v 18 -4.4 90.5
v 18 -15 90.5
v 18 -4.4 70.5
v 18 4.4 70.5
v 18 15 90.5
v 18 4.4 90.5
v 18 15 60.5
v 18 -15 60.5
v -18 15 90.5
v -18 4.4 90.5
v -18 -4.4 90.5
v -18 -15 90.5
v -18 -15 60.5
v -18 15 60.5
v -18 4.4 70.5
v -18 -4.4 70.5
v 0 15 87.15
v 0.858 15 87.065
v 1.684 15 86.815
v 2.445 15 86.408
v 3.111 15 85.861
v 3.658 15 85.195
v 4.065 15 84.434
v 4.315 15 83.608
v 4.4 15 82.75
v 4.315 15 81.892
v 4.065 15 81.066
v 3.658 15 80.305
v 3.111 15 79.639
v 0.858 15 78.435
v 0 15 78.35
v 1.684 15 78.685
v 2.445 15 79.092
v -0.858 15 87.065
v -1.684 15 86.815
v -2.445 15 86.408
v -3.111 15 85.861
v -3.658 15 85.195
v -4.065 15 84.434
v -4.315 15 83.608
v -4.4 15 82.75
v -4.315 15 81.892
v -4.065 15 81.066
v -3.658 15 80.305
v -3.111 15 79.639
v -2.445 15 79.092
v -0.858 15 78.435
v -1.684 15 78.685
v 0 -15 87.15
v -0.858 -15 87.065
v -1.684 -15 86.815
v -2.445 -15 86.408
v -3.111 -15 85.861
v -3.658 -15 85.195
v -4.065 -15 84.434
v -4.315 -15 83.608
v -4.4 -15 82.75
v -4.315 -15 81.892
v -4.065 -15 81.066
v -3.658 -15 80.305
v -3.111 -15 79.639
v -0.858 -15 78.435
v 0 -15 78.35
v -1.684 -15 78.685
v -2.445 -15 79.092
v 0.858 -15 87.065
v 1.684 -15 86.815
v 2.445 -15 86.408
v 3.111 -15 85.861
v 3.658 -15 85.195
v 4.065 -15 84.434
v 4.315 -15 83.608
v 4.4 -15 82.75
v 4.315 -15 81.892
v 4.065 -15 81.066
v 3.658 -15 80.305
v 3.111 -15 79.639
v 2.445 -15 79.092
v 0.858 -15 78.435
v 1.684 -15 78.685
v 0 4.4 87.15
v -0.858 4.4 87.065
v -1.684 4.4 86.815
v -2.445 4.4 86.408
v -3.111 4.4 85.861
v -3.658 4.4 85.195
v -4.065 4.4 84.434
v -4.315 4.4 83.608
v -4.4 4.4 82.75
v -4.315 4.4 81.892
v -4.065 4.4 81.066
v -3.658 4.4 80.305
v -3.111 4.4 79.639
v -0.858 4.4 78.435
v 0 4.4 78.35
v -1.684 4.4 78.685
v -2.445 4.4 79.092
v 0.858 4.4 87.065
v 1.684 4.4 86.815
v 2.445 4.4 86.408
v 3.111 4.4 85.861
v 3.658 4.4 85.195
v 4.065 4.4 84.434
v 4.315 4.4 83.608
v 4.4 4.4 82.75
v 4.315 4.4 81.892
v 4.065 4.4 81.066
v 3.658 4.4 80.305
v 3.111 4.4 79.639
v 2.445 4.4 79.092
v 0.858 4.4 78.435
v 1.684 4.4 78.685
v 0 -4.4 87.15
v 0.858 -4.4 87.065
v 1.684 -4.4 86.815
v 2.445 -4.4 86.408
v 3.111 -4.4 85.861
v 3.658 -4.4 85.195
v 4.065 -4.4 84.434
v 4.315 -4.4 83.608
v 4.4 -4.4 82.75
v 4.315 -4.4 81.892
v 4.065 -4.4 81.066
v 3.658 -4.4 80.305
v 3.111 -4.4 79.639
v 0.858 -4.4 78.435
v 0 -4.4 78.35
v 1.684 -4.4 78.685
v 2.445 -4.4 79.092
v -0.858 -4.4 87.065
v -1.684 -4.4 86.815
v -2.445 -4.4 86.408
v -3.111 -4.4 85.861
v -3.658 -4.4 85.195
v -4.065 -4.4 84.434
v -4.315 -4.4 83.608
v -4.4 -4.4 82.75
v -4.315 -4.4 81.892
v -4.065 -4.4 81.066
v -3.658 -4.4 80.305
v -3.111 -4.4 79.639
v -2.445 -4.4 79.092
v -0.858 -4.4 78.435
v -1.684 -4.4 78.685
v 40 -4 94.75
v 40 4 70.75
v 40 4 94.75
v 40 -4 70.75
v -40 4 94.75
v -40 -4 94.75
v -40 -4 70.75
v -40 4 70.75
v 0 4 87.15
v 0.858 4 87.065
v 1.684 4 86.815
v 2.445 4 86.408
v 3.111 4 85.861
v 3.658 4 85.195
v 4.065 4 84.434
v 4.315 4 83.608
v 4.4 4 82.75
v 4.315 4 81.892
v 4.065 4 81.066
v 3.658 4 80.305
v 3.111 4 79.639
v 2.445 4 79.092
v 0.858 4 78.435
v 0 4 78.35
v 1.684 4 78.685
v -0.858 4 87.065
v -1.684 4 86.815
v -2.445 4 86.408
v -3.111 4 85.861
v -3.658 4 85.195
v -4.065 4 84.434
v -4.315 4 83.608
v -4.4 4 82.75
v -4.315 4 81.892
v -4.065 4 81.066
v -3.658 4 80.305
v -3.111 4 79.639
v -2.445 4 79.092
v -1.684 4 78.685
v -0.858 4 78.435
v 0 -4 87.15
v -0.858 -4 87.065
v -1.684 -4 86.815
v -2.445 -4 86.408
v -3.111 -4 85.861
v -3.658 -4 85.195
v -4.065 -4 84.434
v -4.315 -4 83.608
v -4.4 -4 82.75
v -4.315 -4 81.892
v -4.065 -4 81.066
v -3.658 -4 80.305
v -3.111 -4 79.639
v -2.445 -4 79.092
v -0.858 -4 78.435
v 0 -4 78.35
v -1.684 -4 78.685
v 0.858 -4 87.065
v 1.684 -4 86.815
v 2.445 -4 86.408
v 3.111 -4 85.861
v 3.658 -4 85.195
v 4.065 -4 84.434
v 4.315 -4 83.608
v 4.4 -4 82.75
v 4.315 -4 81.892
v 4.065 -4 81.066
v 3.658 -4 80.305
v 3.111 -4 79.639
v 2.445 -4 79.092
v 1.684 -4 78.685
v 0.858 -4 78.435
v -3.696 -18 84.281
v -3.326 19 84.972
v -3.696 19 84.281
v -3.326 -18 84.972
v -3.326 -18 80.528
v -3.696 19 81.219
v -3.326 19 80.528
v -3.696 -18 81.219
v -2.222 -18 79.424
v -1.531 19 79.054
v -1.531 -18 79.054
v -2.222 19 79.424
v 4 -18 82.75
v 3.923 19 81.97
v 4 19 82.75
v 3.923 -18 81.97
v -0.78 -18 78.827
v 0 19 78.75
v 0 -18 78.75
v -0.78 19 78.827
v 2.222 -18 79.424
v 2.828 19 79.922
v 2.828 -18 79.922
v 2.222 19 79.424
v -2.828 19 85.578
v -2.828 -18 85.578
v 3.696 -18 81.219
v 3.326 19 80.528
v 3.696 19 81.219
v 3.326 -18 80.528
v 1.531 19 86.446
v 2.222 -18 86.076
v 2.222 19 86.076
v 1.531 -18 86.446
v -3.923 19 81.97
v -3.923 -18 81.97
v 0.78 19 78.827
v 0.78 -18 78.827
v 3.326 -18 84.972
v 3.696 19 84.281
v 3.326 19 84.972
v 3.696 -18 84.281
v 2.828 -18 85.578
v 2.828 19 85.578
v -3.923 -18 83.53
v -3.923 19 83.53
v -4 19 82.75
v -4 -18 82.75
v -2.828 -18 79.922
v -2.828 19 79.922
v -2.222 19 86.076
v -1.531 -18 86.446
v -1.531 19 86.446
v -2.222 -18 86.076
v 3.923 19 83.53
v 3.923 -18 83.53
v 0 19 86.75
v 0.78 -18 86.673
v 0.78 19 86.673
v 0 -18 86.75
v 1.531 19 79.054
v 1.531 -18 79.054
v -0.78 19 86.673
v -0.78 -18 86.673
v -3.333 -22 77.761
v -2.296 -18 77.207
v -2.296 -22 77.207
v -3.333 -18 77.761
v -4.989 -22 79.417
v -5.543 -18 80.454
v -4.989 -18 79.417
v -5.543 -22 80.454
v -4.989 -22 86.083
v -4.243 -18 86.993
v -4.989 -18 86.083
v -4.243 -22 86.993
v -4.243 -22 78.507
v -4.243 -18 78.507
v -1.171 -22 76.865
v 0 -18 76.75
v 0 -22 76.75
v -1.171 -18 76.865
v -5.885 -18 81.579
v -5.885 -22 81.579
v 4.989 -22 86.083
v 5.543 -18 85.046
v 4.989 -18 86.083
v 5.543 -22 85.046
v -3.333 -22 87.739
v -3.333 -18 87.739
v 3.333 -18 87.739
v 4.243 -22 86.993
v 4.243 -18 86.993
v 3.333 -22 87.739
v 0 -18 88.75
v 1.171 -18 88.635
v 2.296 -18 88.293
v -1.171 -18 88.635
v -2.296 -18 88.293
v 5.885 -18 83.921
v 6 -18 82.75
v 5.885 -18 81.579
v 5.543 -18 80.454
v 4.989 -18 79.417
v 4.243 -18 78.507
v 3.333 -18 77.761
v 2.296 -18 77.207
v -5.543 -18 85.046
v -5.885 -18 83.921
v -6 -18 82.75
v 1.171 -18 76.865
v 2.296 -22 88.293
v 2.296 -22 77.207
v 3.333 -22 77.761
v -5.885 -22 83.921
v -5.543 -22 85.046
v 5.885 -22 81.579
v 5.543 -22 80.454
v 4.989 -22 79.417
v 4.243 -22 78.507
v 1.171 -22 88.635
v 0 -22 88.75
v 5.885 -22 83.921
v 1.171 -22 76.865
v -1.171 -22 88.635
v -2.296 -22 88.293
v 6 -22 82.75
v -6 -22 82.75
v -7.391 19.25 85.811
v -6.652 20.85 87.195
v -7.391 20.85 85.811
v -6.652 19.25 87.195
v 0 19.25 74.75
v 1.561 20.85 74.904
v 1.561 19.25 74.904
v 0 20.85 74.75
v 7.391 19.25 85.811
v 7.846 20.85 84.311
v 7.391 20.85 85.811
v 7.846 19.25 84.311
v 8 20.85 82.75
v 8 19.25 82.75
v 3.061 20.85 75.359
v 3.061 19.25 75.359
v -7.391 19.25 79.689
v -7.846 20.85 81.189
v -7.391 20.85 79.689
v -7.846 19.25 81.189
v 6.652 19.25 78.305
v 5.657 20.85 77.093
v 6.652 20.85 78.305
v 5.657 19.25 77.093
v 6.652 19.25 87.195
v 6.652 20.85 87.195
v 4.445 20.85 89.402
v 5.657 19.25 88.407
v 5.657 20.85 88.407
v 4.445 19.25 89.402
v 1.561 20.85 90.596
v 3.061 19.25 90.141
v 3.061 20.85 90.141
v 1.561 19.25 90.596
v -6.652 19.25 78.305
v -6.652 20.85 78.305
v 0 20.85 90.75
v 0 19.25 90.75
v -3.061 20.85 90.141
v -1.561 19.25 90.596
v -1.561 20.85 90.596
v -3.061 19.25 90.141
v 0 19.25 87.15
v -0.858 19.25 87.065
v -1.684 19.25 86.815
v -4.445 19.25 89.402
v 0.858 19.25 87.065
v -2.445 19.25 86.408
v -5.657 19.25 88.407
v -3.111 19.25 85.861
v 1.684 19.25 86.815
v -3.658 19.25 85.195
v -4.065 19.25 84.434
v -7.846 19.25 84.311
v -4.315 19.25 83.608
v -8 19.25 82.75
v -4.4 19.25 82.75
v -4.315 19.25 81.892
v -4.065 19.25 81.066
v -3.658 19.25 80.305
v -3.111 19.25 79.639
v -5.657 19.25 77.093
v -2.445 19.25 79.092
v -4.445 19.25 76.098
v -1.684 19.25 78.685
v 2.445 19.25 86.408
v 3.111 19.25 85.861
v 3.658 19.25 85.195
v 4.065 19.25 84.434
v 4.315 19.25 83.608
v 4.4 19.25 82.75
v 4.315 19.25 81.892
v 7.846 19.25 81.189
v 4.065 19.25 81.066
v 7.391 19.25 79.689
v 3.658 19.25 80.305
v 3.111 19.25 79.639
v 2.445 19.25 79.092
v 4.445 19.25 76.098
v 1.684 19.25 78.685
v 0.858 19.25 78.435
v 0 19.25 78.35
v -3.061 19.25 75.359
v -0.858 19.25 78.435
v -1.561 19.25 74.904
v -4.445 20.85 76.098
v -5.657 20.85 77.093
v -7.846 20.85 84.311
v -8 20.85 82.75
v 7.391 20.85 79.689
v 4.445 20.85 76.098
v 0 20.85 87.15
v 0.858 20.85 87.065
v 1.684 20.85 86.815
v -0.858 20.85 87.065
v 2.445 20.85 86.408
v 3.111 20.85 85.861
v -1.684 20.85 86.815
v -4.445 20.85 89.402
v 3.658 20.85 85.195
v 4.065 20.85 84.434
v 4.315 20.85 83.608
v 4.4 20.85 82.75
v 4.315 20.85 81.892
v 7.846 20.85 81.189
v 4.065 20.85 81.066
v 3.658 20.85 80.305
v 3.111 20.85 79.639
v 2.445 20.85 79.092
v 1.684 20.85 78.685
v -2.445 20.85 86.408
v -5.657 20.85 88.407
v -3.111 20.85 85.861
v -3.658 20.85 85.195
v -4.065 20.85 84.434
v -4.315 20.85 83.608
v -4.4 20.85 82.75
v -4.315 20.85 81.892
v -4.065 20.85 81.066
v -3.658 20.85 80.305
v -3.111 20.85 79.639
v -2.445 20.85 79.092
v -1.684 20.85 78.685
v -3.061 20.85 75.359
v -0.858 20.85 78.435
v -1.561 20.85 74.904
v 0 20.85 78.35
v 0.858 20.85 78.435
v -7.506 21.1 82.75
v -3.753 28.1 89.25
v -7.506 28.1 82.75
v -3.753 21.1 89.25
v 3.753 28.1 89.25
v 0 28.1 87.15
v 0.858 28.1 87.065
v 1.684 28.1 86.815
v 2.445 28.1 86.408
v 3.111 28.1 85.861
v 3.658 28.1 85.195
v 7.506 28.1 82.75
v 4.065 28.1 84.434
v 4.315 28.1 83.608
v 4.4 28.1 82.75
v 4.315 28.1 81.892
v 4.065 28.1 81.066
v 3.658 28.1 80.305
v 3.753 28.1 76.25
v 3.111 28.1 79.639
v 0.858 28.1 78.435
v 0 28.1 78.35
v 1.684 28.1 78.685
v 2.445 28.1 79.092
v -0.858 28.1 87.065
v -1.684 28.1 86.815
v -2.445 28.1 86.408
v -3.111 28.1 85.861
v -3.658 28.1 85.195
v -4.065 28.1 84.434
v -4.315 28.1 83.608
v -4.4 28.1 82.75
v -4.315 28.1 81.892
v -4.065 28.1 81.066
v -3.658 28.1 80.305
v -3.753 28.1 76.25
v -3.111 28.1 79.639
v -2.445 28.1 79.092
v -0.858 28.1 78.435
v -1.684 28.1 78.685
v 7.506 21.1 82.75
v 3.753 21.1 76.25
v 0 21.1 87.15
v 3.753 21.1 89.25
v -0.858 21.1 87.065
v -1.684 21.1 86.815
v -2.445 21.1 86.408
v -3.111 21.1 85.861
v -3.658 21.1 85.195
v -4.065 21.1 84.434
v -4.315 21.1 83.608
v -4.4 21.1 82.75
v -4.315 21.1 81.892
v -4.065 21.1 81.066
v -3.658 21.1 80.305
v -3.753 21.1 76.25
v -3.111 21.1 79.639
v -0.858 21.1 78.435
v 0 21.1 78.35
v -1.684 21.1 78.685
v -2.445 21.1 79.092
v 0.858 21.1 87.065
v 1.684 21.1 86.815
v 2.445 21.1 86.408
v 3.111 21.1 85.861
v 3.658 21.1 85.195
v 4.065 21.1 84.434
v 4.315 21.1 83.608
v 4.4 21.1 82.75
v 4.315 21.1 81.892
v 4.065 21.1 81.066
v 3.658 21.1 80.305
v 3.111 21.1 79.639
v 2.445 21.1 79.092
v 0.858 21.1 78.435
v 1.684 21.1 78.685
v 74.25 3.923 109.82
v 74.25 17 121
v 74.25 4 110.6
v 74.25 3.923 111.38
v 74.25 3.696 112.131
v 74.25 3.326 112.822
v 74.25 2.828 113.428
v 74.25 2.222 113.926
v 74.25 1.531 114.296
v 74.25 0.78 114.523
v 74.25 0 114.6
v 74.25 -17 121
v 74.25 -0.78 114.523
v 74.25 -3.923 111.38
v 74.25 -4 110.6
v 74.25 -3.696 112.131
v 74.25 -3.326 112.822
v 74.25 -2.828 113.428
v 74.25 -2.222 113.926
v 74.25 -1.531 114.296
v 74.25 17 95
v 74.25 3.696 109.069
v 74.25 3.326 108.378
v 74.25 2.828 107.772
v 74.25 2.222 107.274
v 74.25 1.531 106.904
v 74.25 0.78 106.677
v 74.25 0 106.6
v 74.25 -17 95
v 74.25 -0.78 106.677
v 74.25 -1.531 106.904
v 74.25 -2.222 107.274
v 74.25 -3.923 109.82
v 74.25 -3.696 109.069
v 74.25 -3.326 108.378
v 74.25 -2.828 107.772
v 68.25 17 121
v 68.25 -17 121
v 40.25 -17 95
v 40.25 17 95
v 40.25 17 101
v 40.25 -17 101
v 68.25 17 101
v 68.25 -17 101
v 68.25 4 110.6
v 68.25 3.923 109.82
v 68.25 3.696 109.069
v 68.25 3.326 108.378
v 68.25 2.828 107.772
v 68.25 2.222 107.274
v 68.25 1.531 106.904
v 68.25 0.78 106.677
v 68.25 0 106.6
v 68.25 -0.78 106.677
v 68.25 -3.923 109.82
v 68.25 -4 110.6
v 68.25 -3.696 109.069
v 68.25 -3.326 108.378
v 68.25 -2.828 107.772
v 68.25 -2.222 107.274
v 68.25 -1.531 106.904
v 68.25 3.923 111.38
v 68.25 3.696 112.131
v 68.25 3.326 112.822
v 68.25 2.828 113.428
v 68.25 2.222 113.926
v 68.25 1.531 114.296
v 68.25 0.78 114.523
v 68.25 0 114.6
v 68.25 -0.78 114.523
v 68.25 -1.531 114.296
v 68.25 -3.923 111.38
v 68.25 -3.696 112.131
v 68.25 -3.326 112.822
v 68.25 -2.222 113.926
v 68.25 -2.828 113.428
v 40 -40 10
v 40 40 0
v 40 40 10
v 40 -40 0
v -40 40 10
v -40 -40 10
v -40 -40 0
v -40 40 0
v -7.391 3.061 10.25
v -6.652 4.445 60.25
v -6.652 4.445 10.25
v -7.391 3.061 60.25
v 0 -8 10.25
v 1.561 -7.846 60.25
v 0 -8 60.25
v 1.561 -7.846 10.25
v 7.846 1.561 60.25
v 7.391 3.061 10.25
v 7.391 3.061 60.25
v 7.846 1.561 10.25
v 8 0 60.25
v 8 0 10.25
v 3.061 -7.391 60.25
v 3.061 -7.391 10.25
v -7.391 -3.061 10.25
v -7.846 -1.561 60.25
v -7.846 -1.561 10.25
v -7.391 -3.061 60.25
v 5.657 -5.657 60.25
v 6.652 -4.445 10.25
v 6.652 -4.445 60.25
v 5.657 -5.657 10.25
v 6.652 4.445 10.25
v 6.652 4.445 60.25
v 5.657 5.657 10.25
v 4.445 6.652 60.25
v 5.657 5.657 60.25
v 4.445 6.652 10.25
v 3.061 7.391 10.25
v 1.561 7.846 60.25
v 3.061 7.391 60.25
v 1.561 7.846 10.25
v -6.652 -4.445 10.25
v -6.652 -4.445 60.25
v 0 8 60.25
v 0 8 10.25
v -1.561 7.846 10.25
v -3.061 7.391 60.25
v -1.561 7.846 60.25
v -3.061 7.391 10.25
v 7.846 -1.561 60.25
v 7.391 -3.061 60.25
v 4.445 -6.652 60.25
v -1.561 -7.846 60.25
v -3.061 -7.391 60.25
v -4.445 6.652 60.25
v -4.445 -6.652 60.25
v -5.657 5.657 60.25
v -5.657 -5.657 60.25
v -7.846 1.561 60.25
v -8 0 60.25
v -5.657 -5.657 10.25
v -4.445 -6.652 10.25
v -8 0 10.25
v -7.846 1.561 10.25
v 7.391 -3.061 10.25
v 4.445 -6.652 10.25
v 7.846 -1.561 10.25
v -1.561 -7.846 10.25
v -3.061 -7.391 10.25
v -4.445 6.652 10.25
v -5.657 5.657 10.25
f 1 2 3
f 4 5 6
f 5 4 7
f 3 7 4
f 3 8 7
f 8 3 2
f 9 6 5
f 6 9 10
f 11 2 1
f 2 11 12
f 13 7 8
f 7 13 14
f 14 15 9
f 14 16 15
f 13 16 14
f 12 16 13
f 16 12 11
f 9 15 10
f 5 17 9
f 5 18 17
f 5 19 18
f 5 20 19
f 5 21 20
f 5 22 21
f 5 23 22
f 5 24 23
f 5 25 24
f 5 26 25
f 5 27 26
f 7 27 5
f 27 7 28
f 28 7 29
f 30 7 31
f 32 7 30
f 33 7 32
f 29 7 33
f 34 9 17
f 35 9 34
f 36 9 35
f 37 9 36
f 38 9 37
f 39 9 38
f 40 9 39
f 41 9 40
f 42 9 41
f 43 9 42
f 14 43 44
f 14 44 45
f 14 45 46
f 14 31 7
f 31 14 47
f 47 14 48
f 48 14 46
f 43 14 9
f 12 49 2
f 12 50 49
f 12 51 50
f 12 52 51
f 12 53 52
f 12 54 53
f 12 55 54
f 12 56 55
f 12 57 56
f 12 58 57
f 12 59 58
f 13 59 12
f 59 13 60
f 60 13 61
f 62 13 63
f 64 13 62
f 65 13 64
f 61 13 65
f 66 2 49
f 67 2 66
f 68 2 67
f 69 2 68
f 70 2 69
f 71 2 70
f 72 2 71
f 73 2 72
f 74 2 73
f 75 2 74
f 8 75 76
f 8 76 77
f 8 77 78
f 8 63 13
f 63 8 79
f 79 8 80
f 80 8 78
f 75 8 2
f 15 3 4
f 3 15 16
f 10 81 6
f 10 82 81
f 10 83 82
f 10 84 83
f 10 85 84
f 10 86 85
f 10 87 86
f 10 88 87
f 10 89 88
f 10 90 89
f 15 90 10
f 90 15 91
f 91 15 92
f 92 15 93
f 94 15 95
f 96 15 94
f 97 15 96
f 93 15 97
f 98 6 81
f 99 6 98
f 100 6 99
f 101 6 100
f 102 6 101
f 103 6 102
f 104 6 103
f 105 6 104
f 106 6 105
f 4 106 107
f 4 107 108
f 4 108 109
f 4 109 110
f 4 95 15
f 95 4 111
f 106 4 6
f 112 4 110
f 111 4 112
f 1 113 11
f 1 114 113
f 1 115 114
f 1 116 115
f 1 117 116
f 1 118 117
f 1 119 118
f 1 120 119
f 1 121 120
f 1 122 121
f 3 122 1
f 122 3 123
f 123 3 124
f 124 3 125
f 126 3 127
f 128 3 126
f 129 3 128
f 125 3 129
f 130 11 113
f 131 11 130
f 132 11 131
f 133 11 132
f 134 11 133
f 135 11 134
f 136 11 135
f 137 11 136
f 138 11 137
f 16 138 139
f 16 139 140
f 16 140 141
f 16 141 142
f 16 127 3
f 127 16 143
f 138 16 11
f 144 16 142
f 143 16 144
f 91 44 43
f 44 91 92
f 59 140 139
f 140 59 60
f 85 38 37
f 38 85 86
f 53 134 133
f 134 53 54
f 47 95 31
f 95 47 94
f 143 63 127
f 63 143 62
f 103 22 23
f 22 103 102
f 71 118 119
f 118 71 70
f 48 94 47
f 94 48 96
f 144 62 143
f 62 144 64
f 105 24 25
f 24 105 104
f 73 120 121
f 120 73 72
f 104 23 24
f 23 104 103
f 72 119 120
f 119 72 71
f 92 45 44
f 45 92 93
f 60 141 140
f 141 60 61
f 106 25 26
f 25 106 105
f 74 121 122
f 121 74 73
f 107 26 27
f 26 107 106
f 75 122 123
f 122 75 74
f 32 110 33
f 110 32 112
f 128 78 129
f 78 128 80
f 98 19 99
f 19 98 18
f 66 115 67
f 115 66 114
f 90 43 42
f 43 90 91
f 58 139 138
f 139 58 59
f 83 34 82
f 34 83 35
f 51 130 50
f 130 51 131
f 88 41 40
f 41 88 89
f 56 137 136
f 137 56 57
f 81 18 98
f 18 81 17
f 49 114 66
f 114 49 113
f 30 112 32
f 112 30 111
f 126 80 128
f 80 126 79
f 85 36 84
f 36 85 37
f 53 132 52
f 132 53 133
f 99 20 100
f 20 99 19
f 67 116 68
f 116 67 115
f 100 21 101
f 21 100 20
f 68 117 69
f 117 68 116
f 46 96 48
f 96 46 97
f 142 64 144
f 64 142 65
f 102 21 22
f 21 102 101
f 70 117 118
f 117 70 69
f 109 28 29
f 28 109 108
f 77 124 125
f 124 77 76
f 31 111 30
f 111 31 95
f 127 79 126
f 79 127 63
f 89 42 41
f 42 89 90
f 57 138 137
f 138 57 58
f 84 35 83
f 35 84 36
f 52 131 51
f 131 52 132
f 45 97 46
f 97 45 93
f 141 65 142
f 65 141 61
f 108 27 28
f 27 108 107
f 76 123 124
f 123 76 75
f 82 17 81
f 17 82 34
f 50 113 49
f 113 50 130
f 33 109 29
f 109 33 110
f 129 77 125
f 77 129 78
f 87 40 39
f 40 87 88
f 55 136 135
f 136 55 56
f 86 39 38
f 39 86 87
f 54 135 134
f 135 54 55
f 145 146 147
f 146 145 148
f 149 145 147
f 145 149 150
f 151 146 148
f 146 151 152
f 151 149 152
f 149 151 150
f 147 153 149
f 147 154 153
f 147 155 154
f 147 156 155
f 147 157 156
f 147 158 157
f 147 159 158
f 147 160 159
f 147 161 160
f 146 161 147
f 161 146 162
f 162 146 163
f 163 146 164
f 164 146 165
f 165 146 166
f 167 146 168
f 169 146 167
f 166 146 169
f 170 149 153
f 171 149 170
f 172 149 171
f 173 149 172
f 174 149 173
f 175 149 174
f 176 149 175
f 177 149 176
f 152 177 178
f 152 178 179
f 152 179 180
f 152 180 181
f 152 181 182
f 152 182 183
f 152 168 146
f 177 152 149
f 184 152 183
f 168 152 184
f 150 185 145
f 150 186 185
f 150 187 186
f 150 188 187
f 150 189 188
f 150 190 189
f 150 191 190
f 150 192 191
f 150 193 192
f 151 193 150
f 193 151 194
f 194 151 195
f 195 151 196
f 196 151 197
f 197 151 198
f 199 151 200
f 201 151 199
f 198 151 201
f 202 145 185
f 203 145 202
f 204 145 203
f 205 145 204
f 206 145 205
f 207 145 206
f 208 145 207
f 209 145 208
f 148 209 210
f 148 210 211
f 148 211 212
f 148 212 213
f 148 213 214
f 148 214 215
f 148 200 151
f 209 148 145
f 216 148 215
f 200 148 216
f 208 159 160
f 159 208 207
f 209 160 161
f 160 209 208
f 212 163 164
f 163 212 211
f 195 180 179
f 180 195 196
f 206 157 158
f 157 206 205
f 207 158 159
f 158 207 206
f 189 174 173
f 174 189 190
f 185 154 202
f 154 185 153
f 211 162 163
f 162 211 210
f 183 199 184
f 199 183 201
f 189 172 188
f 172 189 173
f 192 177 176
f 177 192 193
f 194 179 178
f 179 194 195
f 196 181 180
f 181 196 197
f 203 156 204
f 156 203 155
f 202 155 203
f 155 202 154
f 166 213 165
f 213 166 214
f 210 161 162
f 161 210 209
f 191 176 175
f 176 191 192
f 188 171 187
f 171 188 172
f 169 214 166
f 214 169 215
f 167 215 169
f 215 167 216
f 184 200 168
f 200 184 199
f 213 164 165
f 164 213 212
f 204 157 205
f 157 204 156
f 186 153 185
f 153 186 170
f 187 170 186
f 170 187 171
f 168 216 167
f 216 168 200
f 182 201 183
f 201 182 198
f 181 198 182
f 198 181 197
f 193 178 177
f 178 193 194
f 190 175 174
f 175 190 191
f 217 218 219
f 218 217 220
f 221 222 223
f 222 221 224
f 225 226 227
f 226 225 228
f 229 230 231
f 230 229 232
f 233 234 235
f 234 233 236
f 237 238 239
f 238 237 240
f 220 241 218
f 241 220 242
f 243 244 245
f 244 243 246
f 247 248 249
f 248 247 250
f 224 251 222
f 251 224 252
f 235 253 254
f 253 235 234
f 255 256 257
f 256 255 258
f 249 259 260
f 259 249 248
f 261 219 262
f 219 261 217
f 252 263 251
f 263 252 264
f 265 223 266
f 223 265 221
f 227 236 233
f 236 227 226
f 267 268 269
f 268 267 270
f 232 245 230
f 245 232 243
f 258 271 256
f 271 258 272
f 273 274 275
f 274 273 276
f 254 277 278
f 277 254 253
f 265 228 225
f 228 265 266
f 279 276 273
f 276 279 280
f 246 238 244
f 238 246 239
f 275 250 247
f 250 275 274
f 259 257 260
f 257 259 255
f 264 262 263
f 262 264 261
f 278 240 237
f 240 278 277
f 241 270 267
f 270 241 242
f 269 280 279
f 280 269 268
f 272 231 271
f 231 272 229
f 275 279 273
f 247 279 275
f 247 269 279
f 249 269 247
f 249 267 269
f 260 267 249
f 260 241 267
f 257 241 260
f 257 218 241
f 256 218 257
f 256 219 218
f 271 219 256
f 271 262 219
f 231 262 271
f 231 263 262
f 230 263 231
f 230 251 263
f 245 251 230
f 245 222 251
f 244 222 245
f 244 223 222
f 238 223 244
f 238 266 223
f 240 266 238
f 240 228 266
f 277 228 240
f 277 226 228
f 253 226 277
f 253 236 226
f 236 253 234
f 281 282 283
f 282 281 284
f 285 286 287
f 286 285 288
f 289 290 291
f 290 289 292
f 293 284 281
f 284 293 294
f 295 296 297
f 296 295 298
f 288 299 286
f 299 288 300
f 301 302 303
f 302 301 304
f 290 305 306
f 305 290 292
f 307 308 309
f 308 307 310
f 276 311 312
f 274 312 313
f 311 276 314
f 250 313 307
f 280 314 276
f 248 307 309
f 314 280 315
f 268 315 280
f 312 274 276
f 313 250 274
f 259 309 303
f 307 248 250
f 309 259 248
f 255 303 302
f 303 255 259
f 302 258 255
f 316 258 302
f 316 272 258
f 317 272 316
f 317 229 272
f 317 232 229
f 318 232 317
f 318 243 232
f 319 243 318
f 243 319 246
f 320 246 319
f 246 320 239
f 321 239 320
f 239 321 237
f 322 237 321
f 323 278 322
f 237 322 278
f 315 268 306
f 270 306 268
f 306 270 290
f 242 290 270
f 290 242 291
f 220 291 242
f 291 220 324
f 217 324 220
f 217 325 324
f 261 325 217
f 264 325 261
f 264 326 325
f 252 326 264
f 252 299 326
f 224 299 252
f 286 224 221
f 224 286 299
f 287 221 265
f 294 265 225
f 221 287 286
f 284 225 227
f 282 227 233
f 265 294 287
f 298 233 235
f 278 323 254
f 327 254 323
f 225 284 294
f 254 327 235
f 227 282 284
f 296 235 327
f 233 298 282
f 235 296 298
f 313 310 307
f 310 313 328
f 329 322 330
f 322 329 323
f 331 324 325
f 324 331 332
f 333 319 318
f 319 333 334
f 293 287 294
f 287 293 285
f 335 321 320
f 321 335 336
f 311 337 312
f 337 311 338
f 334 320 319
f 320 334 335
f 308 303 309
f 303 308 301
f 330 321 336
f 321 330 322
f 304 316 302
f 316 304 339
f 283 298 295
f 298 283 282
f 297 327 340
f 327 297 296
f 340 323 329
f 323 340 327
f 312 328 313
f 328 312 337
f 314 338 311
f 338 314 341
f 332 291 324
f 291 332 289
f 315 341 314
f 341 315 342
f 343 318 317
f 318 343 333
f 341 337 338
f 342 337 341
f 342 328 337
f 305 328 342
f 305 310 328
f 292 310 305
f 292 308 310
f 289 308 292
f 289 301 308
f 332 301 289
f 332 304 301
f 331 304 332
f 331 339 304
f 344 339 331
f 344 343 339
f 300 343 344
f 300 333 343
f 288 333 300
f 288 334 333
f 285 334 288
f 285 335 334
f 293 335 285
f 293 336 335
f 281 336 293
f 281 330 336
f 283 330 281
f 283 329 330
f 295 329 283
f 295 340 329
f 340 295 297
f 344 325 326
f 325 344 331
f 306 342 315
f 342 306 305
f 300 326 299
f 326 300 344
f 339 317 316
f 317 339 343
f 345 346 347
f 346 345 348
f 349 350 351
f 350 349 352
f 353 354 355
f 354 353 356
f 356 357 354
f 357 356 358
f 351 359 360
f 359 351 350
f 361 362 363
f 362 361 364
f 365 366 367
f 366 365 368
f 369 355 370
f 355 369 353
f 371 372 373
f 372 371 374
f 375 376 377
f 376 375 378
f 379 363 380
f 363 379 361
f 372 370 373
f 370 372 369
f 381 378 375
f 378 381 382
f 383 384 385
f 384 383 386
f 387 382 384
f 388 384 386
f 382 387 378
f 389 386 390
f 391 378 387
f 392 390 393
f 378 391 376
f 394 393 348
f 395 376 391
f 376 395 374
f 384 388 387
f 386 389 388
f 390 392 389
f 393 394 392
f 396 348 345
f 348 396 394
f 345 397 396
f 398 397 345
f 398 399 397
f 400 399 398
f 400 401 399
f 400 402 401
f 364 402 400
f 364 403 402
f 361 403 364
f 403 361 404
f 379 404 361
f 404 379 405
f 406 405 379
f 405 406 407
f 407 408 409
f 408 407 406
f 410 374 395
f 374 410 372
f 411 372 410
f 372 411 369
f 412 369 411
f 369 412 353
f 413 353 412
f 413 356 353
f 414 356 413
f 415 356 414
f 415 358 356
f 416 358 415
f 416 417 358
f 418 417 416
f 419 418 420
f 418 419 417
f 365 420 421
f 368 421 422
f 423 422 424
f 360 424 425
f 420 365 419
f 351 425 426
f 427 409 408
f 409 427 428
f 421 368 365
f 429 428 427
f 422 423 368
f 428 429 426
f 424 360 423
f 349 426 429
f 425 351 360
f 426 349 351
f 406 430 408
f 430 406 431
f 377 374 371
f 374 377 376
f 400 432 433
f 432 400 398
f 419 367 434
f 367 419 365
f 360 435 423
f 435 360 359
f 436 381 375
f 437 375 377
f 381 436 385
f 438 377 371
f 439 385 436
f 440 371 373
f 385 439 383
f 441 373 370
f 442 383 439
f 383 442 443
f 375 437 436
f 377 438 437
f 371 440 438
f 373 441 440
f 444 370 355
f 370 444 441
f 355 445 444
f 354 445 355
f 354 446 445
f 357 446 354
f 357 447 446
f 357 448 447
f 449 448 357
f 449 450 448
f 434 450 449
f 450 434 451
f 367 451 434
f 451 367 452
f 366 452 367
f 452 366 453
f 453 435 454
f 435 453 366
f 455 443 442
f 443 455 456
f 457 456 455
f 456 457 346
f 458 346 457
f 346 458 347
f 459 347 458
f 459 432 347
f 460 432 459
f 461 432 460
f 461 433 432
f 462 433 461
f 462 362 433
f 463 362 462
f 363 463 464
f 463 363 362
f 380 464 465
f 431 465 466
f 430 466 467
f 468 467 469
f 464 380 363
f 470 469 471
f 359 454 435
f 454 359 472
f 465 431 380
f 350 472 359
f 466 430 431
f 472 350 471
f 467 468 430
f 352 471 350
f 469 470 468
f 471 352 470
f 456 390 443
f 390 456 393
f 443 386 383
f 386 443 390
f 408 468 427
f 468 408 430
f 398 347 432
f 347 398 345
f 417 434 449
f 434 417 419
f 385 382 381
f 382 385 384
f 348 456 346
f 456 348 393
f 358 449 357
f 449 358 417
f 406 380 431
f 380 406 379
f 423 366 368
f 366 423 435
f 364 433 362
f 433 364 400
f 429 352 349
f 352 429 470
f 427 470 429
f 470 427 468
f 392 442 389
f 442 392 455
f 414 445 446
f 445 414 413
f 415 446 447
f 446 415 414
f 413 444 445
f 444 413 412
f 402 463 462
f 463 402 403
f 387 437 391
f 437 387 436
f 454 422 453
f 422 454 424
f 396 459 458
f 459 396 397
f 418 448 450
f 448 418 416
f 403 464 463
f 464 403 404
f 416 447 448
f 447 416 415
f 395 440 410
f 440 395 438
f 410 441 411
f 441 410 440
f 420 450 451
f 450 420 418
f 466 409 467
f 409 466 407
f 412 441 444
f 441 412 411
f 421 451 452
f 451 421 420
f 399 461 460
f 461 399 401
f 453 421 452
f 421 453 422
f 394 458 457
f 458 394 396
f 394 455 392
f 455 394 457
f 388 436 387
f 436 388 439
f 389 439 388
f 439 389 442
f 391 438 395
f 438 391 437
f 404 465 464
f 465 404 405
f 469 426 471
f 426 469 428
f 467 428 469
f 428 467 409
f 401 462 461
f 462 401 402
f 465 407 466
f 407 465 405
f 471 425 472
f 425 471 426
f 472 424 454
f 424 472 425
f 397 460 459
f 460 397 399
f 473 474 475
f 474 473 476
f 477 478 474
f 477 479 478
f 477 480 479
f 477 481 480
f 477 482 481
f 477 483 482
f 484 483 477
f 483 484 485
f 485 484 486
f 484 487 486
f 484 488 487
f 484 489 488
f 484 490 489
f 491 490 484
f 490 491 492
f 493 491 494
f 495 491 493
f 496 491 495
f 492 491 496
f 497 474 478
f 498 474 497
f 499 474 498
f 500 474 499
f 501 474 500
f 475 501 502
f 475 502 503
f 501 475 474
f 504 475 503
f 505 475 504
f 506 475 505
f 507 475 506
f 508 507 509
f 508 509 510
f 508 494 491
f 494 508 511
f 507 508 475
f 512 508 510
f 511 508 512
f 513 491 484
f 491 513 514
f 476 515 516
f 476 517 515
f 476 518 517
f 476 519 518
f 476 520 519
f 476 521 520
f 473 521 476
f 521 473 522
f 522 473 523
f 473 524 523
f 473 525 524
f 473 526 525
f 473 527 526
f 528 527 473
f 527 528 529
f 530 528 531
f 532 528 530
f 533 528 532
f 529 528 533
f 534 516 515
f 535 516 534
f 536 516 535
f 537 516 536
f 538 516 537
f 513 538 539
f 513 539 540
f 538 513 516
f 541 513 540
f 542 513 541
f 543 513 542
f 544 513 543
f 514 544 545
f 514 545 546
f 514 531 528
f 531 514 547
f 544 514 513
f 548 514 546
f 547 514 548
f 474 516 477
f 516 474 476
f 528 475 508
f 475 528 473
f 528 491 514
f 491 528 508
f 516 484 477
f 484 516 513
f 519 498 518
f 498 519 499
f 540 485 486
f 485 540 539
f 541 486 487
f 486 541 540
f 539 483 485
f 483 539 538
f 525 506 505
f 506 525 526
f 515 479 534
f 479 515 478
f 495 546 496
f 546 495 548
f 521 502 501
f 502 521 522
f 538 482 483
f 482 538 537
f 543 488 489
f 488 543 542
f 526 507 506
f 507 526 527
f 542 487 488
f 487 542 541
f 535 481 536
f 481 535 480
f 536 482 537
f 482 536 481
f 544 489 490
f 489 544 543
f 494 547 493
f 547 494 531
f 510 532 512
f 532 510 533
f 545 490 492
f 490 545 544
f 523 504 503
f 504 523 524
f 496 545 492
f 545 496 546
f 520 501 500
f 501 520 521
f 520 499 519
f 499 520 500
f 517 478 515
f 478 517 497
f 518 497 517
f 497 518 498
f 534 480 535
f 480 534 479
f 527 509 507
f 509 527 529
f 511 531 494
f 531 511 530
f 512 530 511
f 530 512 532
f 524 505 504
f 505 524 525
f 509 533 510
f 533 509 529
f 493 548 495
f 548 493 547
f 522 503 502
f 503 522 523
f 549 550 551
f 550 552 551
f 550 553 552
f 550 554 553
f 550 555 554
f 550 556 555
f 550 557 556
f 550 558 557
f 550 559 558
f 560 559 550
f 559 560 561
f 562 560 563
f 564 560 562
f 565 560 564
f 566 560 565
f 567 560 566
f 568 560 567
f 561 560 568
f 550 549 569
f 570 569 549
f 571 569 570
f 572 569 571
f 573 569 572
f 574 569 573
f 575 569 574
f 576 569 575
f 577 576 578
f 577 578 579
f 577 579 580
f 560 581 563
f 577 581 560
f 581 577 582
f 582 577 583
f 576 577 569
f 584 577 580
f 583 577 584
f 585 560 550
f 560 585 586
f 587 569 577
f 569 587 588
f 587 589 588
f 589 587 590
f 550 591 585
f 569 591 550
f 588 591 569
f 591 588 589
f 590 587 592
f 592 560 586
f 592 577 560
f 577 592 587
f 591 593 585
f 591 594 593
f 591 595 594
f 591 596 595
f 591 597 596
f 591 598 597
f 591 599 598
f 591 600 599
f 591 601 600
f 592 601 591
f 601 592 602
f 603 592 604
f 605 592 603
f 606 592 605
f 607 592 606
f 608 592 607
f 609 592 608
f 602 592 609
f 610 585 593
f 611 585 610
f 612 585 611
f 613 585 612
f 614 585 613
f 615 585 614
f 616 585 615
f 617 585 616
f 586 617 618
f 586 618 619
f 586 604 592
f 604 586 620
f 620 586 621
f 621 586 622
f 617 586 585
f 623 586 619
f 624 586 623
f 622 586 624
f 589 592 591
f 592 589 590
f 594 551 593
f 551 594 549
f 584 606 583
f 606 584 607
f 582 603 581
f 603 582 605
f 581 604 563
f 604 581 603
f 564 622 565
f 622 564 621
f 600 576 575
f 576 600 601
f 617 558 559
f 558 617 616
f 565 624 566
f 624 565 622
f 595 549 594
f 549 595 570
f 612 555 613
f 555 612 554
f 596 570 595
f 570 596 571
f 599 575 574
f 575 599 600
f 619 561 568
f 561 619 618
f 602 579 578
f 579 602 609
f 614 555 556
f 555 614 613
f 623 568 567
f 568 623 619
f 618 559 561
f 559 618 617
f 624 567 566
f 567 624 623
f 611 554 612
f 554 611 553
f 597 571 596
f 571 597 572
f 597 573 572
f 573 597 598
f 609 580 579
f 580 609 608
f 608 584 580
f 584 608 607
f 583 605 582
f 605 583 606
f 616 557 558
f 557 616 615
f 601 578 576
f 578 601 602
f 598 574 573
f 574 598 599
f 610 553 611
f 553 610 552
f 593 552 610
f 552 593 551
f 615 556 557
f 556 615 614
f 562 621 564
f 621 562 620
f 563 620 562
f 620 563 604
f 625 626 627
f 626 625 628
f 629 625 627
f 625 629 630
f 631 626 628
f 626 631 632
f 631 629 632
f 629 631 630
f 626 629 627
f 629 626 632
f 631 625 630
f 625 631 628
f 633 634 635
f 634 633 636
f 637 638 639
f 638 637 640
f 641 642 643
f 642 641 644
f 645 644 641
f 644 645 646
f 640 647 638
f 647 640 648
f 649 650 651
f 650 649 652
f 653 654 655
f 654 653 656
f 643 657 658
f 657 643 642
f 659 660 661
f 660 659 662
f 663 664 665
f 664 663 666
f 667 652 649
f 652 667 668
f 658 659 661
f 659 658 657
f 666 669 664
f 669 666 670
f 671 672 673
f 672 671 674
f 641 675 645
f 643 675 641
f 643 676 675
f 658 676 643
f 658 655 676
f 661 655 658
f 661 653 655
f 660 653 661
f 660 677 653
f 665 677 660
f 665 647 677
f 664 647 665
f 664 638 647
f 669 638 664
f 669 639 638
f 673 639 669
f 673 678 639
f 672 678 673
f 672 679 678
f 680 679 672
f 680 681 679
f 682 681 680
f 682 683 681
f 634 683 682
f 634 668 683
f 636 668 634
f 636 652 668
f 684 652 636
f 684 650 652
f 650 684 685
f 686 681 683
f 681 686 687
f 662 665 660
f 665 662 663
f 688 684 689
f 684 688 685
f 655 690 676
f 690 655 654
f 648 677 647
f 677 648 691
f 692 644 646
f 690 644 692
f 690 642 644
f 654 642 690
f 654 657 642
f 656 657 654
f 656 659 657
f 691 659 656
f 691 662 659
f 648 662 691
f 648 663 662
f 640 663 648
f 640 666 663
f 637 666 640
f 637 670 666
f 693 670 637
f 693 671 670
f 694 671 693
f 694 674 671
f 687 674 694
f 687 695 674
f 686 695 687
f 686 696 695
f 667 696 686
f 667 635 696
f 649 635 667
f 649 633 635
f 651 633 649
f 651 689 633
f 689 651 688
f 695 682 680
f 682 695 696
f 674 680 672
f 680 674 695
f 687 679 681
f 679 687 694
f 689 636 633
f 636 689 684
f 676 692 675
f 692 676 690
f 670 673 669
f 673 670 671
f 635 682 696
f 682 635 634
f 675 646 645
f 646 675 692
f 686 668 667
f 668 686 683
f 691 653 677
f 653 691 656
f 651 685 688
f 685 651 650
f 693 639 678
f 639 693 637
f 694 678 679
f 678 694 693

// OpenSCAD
$fn = 32;

// ------------------------------------------------------------------------
// Lamp arm: column d16 x 50 mm, arm 80 mm
// Every part is its own module, assembly() places every instance.
// ------------------------------------------------------------------------

// --- part 1 ---
module lamp_base() {
  difference() {
    translate([-40, -40, 0]) cube([80, 80, 10]);
  }
}

// --- part 2 ---
module lamp_column() {
  cylinder(h = 50, d = 16);
}

// --- part 3 ---
module head_fork() {
  difference() {
    translate([-18, -15, 0]) cube([36, 30, 30]);
    translate([-19, -4.4, 10]) cube([38, 8.8, 21]);
    translate([0, 0, 22.25]) rotate([90, 0, 0]) cylinder(h = 32, d = 8.8, center = true);
  }
}

// --- part 4 ---
module lamp_arm() {
  difference() {
    translate([-40, -4, 0]) cube([80, 8, 24]);
    translate([0, 0, 12]) rotate([90, 0, 0]) cylinder(h = 10, d = 8.8, center = true);
  }
}

// --- part 5 ---
module arm_pin() {
  rotate([0, 90, 0]) cylinder(h = 38, d = 8, center = true);
  translate([-22, 0, 0]) rotate([0, 90, 0]) cylinder(h = 4, d = 12);
}

// --- part 6 ---
module arm_washer() {
  difference() {
      translate([0, 0, 0]) cylinder(h = 1.6, d = 16);
      translate([0, 0, -1]) cylinder(h = 3.6, d = 8.8);
    }
}

// --- part 7 ---
module arm_nut() {
  difference() {
    linear_extrude(height = 7) polygon(points = [[7.506, 0], [3.753, 6.5], [-3.753, 6.5], [-7.506, 0], [-3.753, -6.5], [3.753, -6.5]]);
    translate([0, 0, -1]) cylinder(h = 9, d = 8.8);
  }
}

// --- part 8 ---
module shade_bracket() {
  difference() {
    translate([-17, -17, 0]) cube([34, 34, 26]);
    translate([-18, -18, 6]) cube([29, 36, 21]);
    translate([14, 0, 15.6]) rotate([0, 90, 0]) cylinder(h = 8, d = 8, center = true);
  }
}

// --- assembly ---
module assembly() {
  color([0.80, 0.24, 0.20]) translate([0, 0, 0]) rotate([0, 0, 0]) lamp_base();
  color([0.20, 0.45, 0.75]) translate([0, 0, 10.25]) rotate([0, 0, 0]) lamp_column();
  color([0.25, 0.62, 0.32]) translate([0, 0, 60.5]) rotate([0, 0, 0]) head_fork();
  color([0.92, 0.70, 0.18]) translate([0, 0, 70.75]) rotate([0, 0, 0]) lamp_arm();
  color([0.58, 0.35, 0.70]) translate([0, 0, 82.75]) rotate([0, 0, 90]) arm_pin();
  color([0.16, 0.66, 0.66]) translate([0, 20.85, 82.75]) rotate([90, 0, 0]) arm_washer();
  color([0.85, 0.48, 0.18]) translate([0, 28.1, 82.75]) rotate([90, 0, 0]) arm_nut();
  color([0.55, 0.60, 0.65]) translate([57.25, 0, 95]) rotate([0, 0, 0]) shade_bracket();
}

assembly();
